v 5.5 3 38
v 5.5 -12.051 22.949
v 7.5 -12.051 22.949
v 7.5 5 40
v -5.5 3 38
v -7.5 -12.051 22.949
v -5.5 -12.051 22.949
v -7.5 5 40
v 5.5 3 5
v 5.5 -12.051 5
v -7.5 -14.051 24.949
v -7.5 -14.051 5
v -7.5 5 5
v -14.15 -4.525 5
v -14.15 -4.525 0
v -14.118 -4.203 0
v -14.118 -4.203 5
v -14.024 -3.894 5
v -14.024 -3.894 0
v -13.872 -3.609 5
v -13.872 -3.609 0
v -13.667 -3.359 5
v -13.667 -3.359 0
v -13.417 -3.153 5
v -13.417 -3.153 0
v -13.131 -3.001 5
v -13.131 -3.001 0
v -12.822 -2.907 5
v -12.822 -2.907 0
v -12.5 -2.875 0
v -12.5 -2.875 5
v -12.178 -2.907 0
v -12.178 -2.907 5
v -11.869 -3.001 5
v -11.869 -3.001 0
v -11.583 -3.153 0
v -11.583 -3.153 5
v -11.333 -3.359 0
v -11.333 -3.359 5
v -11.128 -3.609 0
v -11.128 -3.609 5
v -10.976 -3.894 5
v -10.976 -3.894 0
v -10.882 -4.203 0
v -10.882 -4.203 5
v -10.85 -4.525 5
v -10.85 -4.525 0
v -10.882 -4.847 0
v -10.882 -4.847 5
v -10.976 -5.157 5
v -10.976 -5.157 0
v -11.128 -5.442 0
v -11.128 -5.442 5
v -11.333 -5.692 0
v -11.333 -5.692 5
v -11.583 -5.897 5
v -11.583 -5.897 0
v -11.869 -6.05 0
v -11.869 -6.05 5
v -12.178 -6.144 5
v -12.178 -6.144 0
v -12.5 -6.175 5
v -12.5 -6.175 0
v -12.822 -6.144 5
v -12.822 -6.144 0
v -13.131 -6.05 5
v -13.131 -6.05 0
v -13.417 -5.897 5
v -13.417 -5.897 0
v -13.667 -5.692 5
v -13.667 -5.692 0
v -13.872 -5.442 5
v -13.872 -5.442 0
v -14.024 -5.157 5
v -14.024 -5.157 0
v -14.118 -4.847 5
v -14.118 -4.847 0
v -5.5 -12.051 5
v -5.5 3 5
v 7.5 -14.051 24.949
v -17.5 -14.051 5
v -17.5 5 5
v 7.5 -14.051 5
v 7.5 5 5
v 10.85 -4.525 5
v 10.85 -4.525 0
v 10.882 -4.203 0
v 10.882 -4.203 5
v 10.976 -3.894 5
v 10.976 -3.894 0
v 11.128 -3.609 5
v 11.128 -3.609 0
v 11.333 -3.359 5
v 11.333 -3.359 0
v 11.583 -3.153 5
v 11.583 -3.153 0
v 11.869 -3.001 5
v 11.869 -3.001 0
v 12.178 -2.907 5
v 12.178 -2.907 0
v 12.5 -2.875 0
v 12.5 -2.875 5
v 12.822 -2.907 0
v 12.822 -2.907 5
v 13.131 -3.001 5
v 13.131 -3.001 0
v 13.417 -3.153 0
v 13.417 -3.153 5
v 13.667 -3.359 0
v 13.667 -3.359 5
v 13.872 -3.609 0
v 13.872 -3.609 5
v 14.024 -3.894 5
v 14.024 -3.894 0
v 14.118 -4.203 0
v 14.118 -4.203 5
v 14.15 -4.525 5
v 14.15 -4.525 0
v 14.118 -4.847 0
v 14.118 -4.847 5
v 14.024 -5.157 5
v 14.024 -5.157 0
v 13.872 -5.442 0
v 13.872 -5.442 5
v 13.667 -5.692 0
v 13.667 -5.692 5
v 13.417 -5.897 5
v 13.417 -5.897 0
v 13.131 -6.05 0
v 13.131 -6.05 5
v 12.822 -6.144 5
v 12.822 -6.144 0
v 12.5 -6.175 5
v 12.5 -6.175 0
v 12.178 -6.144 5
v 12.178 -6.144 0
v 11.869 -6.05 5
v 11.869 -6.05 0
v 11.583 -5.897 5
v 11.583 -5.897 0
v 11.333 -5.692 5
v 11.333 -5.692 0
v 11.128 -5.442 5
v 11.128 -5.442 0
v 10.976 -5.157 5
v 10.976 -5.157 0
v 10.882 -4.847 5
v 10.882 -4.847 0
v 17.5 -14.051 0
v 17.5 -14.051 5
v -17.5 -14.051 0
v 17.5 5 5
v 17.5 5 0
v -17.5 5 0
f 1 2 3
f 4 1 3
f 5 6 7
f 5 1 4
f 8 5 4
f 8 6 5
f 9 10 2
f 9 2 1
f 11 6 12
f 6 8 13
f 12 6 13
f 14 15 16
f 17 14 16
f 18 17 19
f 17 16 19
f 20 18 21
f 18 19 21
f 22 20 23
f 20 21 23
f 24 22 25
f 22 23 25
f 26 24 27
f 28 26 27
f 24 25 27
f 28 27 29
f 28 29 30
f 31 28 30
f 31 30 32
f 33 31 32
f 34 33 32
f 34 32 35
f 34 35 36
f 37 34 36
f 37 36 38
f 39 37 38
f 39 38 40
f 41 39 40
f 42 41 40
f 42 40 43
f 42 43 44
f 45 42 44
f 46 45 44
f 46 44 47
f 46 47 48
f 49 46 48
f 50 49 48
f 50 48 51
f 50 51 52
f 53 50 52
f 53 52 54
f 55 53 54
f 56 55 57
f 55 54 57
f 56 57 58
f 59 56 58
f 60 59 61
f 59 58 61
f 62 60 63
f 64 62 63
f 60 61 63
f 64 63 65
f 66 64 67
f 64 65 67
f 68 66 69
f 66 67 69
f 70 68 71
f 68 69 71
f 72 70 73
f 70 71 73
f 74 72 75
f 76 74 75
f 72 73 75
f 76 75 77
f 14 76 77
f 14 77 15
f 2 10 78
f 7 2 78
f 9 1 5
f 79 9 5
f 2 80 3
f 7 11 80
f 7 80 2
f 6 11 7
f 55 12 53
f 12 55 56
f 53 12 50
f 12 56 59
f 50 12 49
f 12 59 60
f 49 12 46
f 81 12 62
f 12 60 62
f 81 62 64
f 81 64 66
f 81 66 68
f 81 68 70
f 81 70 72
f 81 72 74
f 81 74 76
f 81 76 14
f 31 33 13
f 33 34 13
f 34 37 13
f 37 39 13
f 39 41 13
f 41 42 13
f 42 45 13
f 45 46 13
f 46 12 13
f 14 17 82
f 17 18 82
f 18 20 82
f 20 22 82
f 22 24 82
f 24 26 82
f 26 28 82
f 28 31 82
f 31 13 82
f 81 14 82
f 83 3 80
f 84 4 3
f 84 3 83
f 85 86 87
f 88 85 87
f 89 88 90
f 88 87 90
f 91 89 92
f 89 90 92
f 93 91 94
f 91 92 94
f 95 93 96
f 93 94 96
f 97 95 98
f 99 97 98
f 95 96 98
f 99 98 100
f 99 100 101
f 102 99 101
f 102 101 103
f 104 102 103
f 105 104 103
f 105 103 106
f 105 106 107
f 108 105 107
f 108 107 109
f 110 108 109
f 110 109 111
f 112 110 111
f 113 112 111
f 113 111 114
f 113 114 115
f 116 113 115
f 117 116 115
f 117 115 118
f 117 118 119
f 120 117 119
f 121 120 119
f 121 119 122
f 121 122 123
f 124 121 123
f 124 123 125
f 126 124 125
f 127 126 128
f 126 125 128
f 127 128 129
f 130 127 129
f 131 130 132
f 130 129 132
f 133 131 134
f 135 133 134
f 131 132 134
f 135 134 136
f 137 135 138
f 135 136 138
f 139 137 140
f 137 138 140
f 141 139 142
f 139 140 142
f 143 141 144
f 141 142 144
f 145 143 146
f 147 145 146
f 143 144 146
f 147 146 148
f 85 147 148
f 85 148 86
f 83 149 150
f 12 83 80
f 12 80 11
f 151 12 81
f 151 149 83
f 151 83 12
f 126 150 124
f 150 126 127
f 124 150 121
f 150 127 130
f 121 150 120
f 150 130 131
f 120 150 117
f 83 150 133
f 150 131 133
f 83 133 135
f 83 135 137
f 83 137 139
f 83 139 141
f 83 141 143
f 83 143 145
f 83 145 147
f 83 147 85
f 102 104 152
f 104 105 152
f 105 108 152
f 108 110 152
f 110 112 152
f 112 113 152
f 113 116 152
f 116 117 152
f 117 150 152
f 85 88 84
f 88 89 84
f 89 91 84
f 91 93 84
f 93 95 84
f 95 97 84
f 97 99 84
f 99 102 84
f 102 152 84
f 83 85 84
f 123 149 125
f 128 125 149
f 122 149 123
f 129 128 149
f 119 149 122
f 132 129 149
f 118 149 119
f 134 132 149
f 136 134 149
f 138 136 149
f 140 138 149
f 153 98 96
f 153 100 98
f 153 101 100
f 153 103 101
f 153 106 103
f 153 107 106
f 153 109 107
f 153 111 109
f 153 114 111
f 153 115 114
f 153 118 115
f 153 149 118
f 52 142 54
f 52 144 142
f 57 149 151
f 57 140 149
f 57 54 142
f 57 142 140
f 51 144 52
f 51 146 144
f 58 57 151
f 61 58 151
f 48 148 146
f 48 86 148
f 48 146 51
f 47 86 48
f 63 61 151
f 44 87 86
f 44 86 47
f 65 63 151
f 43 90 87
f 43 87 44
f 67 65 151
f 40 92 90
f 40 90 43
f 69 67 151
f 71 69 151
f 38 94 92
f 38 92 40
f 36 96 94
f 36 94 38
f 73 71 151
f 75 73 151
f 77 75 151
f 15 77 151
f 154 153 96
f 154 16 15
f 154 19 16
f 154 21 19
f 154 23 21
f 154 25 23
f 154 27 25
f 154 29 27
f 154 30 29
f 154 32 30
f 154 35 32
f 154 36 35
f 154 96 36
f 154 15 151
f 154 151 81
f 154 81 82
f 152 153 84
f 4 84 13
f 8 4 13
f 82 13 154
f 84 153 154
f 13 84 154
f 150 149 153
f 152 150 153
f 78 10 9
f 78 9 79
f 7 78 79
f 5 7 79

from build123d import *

# Parameters (mm, degrees)
SKETCH1_W             = 15
SKETCH1_H             = 10
BOSS_EXTRUDE1_DEPTH   = 40
CUT_EXTRUDE1_DEPTH    = 40
BOSS_EXTRUDE2_DEPTH   = 15
SKETCH4_W             = 15
SKETCH4_H             = 24.5
BOSS_EXTRUDE3_DEPTH   = 2
SKETCH5_W             = 11
SKETCH5_H             = 15.050743374
CUT_EXTRUDE2_DEPTH    = 44.054307443
SKETCH6_W             = 10
SKETCH6_H             = 19.050743374
SKETCH6_W_2           = 15
SKETCH6_W_3           = 11
SKETCH6_H_2           = 15.050743374
BOSS_EXTRUDE4_DEPTH   = 5
M4X0_7_TAPPED_HOLE1_D = 3.3
M4X0_7_TAPPED_HOLE2_D = 3.3
CUT_EXTRUDE3_DEPTH    = 50.218120539
BOSS_EXTRUDE5_DEPTH   = 15


with BuildPart() as part:
    # Sketch1 → Boss-Extrude1 (new body)
    with BuildSketch(Plane.XY):
        Rectangle(SKETCH1_W, SKETCH1_H)
    extrude(amount=BOSS_EXTRUDE1_DEPTH)

    # Sketch2 → Cut-Extrude1 (cut)
    with BuildSketch(Plane(origin=(7.5, 0, 0), x_dir=(0, 0, -1), z_dir=(1, 0, 0))):
        Polygon((-40, 5), (-40, -5), (-30, -5), align=None)
    extrude(amount=-CUT_EXTRUDE1_DEPTH, mode=Mode.SUBTRACT)

    # Sketch3 → Boss-Extrude2 (add, through all)
    with BuildSketch(Plane.ZY.offset(7.5)):
        Polygon((0, -12.050743374), (0, -5), (30, -5), (25.477447389, -9.522552611), (22.949256626, -12.050743374), align=None)
    extrude(amount=-BOSS_EXTRUDE2_DEPTH)

    # Sketch4 → Boss-Extrude3 (add)
    with BuildSketch(Plane(origin=(0, -12.050743374, 0), x_dir=(-1, 0, 0), z_dir=(0, -1, 0))):
        with Locations((0, -12.25)):
            Rectangle(SKETCH4_W, SKETCH4_H)
    extrude(amount=BOSS_EXTRUDE3_DEPTH)

    # Sketch5 → Cut-Extrude2 (cut, through all)
    with BuildSketch(Plane(origin=(0, 0, 0), x_dir=(-1, 0, 0), z_dir=(0, 0, -1))):
        with Locations((0, -4.525371687)):
            Rectangle(SKETCH5_W, SKETCH5_H)
    extrude(amount=-CUT_EXTRUDE2_DEPTH, mode=Mode.SUBTRACT)

    # Sketch6 → Boss-Extrude4 (add)
    # profile 1 of 4: a face of its own
    with BuildSketch(Plane(origin=(0, 0, 0), x_dir=(-1, 0, 0), z_dir=(0, 0, -1))):
        with Locations((-12.5, -4.525371687)):
            Rectangle(SKETCH6_W, SKETCH6_H)
    # profile 2 of 4: a face of its own
    with BuildSketch(Plane(origin=(0, 0, 0), x_dir=(-1, 0, 0), z_dir=(0, 0, -1))):
        with Locations((12.5, -4.525371687)):
            Rectangle(SKETCH6_W, SKETCH6_H)
    # profile 3 of 4: a face of its own
    with BuildSketch(Plane(origin=(0, 0, 0), x_dir=(-1, 0, 0), z_dir=(0, 0, -1))):
        with Locations((0, -4.525371687)):
            Rectangle(SKETCH6_W_2, SKETCH6_H)
        with Locations((0, -4.525371687)):
            Rectangle(SKETCH6_W_3, SKETCH6_H_2, mode=Mode.SUBTRACT)
    # profile 4 of 4: a face of its own
    with BuildSketch(Plane(origin=(0, 0, 0), x_dir=(-1, 0, 0), z_dir=(0, 0, -1))):
        with Locations((0, -4.525371687)):
            Rectangle(SKETCH6_W_3, SKETCH6_H_2)
    extrude(amount=-BOSS_EXTRUDE4_DEPTH)

    # M4x0.7 Tapped Hole1 (through all)
    with Locations(Plane.XY.offset(5)):
        with Locations((-12.5, -4.525371687)):
            Hole(M4X0_7_TAPPED_HOLE1_D / 2)

    # M4x0.7 Tapped Hole2 (through all)
    with Locations(Plane.XY.offset(5)):
        with Locations((12.5, -4.525371687)):
            Hole(M4X0_7_TAPPED_HOLE2_D / 2)

    # Sketch13 → Cut-Extrude3 (cut, through all)
    with BuildSketch(Plane.ZY.offset(7.5)):
        Polygon((22.949256626, -12.050743374), (24.5, -14.050743374), (24.5, -12.050743374), align=None)
    extrude(amount=-CUT_EXTRUDE3_DEPTH, mode=Mode.SUBTRACT)

    # Sketch14 → Boss-Extrude5 (add)
    with BuildSketch(Plane.ZY.offset(7.5)):
        Polygon((22.949256626, -12.050743374), (22.949256626, -14.050743374), (24.949256626, -14.050743374), align=None)
    extrude(amount=-BOSS_EXTRUDE5_DEPTH)


solid = part.part
